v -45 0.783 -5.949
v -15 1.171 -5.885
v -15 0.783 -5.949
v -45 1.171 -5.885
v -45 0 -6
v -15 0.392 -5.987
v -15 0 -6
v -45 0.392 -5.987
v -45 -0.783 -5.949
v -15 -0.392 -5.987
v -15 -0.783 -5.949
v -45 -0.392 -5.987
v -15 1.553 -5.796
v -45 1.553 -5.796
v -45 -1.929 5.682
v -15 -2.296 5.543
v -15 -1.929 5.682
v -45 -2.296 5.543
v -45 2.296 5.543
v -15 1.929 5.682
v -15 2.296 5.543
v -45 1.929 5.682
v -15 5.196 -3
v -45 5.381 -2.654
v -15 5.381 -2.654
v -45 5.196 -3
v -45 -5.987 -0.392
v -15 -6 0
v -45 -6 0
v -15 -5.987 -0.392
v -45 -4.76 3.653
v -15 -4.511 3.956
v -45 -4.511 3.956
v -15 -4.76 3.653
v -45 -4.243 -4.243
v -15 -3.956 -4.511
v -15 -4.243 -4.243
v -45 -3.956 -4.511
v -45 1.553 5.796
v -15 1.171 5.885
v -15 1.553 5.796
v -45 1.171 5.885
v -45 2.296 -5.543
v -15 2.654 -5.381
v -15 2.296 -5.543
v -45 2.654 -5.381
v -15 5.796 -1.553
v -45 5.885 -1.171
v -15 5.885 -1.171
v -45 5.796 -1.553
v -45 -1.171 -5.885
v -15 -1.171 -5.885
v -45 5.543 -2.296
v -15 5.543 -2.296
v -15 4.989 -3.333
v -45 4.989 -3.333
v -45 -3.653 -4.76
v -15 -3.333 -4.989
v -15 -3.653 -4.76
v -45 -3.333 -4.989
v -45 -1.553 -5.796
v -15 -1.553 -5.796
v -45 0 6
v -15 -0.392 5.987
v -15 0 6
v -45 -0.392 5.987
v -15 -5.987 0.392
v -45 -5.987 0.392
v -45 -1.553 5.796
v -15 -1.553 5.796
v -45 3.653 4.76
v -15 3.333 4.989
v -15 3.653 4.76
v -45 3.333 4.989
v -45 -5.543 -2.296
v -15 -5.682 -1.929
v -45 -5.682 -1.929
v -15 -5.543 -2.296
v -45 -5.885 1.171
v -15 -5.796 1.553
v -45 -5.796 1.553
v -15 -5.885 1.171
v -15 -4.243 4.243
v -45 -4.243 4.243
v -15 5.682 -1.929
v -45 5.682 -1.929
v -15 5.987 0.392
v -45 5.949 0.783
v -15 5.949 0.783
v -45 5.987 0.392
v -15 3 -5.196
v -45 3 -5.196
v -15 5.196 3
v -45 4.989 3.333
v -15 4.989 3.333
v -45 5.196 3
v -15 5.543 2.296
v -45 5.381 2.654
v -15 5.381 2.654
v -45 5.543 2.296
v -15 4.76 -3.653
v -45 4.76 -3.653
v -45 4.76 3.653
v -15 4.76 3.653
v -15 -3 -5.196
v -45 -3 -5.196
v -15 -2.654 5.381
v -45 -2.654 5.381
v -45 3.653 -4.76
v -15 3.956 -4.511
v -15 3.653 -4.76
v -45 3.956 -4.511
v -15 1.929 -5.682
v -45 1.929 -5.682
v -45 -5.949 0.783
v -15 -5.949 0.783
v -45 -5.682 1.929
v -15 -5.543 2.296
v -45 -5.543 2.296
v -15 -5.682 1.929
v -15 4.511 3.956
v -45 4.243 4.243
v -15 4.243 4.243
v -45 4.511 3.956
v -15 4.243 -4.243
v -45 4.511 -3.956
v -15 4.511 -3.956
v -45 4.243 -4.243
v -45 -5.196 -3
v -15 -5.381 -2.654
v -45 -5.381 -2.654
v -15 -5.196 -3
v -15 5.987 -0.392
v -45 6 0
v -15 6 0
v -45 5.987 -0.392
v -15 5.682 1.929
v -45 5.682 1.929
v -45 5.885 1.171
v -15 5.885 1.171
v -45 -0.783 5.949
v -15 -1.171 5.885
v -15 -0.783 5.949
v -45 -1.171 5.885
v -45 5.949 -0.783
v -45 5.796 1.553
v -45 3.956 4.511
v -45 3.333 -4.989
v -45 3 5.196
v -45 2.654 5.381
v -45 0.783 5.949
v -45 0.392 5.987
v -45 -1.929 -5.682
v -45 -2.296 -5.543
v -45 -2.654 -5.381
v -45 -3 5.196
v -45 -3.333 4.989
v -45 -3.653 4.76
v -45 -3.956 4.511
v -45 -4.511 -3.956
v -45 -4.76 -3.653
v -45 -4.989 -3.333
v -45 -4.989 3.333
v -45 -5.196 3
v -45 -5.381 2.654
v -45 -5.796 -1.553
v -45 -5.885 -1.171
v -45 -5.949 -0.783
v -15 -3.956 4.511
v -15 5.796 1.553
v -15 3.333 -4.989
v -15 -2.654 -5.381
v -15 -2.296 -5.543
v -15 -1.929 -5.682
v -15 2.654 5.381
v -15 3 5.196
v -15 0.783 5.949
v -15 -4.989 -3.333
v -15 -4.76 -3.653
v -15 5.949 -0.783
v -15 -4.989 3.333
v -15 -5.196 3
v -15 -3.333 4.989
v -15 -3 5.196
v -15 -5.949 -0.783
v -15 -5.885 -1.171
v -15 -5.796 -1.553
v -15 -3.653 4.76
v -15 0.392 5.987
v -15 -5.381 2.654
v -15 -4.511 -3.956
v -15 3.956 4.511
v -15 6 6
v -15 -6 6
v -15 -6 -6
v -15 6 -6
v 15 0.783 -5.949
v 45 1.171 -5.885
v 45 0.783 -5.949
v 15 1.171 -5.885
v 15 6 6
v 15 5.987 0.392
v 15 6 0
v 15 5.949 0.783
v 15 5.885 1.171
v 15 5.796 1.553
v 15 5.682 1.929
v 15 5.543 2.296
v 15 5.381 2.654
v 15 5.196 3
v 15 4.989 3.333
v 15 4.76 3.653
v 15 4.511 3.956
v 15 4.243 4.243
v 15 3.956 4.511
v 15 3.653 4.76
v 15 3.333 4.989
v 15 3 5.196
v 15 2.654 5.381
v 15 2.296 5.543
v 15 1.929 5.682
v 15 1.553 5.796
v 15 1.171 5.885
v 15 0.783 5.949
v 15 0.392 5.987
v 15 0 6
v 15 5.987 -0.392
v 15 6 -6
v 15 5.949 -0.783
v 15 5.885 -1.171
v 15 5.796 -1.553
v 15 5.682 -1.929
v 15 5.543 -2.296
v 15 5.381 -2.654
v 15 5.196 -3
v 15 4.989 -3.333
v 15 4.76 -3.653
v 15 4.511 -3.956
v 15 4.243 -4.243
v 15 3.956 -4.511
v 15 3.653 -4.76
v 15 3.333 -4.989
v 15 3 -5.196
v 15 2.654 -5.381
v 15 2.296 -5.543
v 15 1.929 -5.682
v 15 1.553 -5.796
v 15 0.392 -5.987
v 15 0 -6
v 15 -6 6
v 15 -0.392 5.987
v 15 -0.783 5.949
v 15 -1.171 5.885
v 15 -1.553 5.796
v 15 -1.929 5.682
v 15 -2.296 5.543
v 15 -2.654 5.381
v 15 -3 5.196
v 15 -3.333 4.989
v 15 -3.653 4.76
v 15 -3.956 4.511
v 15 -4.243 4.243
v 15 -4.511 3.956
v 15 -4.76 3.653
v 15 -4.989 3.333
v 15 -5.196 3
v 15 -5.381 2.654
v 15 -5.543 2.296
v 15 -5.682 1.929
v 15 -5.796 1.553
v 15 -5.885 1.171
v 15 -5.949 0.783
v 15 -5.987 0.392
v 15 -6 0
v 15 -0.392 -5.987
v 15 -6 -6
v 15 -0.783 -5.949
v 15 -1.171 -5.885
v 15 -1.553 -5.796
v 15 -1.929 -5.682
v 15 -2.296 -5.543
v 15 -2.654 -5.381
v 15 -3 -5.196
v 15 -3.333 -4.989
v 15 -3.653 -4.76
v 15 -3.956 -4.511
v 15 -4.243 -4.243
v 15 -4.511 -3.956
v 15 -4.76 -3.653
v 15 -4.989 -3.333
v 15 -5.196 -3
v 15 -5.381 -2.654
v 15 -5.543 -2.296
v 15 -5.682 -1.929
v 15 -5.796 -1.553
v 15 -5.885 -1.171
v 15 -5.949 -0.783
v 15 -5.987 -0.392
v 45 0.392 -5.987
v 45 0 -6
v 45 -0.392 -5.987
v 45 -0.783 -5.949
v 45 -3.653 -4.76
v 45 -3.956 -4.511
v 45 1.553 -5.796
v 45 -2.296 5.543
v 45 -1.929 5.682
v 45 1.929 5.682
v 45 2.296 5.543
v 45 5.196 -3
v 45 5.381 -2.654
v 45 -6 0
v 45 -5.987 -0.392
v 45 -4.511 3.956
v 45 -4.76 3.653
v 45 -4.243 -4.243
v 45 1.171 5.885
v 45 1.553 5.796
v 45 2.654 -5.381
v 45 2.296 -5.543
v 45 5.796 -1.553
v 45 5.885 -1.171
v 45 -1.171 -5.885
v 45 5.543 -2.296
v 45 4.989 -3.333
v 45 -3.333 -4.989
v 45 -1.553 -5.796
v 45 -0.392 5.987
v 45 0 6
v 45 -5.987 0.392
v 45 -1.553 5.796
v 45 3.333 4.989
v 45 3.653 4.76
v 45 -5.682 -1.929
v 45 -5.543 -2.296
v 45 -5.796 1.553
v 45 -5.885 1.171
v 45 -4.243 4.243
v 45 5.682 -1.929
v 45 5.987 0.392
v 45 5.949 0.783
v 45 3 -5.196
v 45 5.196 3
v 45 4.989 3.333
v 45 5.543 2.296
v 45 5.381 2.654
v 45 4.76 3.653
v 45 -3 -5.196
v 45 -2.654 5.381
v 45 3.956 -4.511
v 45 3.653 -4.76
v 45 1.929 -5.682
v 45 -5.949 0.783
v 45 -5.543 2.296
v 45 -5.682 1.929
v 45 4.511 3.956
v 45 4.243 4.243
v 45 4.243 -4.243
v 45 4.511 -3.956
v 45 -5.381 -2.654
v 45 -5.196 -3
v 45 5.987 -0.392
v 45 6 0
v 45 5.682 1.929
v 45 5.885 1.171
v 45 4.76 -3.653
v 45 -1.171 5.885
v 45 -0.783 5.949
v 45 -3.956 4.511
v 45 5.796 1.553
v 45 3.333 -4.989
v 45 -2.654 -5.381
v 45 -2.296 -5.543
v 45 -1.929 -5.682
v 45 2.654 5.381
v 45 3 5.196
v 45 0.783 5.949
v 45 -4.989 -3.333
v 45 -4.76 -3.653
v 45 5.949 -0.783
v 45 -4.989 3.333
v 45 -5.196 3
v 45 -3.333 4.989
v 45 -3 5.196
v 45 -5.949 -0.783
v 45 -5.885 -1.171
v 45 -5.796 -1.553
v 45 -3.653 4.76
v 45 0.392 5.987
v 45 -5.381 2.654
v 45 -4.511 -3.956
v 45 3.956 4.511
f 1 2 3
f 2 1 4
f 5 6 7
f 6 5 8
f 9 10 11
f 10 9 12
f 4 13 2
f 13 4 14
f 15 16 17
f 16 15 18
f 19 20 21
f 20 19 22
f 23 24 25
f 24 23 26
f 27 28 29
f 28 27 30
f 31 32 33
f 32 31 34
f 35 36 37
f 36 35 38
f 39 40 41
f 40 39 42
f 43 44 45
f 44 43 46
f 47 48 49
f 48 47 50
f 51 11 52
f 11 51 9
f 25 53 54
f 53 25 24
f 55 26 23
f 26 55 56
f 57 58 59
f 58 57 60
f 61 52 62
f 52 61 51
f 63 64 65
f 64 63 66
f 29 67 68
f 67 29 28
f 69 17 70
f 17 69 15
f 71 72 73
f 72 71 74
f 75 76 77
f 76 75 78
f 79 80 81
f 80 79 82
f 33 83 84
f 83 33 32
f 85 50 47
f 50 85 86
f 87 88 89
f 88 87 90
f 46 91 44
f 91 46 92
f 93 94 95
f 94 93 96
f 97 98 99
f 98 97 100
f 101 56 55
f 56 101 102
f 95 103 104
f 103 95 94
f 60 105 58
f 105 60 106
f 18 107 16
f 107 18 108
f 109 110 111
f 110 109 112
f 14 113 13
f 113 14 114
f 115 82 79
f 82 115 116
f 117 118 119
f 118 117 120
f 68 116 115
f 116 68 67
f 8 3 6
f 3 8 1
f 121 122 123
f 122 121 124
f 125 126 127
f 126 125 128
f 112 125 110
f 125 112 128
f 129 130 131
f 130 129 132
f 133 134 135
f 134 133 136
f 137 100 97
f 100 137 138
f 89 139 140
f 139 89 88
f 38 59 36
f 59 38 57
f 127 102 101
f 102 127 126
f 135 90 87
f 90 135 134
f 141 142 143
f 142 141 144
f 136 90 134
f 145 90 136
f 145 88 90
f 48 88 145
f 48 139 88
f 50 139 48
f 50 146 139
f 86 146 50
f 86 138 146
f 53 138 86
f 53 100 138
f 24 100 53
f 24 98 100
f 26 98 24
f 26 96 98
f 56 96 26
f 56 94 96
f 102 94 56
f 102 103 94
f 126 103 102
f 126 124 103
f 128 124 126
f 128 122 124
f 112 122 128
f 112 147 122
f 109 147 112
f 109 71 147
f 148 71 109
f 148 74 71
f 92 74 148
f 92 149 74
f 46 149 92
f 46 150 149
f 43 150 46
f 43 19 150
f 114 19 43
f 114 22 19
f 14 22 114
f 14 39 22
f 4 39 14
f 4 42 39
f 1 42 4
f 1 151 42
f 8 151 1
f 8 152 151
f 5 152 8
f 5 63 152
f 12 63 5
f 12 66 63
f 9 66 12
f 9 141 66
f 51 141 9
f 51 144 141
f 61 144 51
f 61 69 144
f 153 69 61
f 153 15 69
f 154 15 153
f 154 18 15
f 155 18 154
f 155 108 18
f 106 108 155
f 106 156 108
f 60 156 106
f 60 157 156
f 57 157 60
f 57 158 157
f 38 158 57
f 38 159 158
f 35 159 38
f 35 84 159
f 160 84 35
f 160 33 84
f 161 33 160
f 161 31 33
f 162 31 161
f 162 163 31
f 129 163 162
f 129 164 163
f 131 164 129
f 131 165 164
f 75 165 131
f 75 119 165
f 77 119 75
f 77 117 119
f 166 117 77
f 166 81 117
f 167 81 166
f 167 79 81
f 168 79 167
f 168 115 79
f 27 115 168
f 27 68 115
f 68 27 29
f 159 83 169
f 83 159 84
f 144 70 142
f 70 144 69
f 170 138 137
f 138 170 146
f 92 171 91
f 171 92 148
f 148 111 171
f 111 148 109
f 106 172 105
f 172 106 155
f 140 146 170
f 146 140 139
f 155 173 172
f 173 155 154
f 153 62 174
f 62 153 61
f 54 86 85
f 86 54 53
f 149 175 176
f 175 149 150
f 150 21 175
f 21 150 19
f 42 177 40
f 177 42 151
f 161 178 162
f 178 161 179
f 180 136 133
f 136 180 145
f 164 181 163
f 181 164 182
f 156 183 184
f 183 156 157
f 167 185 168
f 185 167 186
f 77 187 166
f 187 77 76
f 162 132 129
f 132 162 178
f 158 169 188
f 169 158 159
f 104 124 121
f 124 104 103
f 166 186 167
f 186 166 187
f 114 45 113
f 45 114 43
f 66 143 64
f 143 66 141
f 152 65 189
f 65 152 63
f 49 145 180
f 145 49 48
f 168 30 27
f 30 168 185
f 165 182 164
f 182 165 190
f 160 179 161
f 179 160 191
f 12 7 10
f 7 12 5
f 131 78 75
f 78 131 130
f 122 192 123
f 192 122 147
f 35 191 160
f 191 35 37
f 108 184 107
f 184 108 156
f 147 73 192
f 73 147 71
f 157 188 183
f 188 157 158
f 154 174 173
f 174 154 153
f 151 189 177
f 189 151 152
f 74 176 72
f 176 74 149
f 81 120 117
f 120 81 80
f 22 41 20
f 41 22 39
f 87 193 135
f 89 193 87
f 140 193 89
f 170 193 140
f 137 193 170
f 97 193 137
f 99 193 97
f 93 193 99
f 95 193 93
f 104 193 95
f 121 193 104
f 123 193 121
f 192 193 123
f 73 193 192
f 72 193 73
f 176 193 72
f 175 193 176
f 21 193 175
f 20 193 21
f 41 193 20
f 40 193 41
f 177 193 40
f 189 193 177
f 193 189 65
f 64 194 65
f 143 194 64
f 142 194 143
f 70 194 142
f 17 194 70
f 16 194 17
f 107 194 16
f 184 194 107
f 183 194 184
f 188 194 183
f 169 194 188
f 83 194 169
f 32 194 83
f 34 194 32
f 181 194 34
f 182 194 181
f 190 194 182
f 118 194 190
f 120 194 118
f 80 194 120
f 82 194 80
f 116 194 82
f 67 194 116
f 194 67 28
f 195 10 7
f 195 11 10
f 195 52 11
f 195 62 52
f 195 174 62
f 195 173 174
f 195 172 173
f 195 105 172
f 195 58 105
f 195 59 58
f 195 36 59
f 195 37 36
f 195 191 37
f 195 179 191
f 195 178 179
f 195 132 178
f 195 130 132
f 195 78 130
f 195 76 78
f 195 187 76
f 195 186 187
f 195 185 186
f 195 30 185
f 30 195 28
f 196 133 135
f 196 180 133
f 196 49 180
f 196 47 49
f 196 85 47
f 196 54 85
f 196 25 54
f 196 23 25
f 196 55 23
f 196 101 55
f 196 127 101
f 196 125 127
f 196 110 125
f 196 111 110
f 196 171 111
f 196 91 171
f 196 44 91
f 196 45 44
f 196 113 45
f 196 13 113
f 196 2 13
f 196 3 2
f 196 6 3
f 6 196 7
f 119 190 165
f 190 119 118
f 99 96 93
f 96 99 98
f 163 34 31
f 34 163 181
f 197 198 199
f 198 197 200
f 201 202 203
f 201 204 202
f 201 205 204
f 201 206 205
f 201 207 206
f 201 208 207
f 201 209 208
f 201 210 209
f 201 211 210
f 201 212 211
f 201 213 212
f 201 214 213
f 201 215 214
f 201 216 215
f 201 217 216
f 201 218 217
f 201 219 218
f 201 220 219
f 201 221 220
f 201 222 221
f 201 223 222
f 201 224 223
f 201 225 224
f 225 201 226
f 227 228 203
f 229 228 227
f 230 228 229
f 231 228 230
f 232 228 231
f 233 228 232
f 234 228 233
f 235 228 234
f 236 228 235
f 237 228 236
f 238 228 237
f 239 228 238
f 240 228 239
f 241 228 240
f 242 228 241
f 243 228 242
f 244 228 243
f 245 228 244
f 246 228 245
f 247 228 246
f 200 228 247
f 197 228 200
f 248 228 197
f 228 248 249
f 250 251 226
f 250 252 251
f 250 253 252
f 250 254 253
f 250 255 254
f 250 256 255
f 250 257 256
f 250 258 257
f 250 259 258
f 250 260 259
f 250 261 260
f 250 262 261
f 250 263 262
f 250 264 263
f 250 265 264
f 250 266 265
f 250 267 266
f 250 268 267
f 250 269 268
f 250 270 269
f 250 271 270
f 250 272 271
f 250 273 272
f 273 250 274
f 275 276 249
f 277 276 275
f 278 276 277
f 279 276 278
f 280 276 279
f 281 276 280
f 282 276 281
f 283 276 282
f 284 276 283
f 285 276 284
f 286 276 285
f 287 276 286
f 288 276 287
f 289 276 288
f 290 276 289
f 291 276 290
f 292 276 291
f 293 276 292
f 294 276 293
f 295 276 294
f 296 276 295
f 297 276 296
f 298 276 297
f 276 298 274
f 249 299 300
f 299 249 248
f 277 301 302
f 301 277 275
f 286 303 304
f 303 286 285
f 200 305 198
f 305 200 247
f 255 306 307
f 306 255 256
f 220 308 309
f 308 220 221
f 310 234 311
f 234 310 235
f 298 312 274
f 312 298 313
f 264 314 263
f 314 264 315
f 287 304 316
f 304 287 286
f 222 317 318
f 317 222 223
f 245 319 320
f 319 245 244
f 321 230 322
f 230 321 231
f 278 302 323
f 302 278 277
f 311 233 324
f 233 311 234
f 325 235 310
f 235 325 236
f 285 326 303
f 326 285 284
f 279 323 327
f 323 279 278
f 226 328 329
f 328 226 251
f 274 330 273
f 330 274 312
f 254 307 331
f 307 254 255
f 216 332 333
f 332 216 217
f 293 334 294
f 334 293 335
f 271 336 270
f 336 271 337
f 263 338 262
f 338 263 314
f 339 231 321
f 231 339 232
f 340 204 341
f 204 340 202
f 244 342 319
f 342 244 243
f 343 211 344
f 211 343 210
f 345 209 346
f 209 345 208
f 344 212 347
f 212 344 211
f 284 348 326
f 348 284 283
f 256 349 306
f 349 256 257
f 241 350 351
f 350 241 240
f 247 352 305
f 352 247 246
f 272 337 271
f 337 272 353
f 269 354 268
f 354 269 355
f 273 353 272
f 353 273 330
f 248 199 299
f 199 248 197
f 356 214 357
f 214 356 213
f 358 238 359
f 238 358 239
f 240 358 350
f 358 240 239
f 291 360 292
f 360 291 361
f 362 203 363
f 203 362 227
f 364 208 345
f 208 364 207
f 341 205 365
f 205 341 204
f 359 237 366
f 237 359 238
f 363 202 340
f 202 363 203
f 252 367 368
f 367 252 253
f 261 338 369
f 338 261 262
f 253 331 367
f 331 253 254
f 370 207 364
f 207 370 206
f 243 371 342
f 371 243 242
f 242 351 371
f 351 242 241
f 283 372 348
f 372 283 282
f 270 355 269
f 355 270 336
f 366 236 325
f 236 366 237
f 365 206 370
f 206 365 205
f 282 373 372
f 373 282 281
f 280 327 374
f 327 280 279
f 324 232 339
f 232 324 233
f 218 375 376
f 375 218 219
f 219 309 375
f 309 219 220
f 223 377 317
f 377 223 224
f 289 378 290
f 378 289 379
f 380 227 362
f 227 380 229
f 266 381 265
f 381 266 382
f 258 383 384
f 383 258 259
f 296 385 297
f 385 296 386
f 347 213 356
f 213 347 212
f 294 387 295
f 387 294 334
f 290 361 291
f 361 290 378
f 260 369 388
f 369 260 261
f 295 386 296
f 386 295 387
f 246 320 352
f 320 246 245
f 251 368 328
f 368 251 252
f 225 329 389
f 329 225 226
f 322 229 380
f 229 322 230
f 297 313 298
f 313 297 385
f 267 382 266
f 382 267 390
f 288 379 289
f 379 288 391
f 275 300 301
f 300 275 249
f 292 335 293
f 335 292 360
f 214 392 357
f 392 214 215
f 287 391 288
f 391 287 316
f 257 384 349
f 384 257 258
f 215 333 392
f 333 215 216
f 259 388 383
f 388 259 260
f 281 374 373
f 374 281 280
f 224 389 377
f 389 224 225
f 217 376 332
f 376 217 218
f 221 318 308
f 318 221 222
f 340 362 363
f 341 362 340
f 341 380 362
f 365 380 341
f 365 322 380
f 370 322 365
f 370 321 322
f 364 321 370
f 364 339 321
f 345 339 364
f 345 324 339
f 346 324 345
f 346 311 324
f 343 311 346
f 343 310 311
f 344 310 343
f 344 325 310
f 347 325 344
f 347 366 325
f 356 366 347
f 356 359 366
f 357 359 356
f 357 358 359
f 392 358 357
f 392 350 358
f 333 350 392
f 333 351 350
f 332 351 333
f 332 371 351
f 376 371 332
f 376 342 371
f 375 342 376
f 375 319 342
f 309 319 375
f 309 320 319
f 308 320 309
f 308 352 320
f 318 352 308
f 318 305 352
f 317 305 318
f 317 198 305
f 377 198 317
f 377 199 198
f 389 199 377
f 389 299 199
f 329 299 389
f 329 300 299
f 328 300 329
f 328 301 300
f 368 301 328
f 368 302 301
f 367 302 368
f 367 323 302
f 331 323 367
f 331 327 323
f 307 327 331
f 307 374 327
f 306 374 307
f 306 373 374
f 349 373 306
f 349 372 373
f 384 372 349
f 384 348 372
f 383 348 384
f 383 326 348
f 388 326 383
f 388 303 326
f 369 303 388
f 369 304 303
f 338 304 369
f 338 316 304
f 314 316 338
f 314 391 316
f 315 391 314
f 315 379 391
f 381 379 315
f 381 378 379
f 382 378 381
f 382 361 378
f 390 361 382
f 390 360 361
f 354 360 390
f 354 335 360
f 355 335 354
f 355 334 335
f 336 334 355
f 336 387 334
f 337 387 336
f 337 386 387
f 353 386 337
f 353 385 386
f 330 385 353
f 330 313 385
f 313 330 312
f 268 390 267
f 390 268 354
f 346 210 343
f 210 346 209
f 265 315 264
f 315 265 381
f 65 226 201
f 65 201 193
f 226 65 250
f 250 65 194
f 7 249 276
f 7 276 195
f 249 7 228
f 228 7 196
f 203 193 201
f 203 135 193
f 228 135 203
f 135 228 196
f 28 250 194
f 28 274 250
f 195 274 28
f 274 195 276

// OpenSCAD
square_width = 12;
square_length = 30;
round_radius = 6;
round_length = 30;

module shaft() {
  union() {
    cube([square_length, square_width, square_width], center = true);

    for (offset = [
      -(square_length + round_length) / 2,
      (square_length + round_length) / 2,
    ]) {
      translate([offset, 0, 0])
        rotate([0, 90, 0])
          cylinder(h = round_length, r = round_radius, center = true, $fn = 96);
    }
  }
}

shaft();
